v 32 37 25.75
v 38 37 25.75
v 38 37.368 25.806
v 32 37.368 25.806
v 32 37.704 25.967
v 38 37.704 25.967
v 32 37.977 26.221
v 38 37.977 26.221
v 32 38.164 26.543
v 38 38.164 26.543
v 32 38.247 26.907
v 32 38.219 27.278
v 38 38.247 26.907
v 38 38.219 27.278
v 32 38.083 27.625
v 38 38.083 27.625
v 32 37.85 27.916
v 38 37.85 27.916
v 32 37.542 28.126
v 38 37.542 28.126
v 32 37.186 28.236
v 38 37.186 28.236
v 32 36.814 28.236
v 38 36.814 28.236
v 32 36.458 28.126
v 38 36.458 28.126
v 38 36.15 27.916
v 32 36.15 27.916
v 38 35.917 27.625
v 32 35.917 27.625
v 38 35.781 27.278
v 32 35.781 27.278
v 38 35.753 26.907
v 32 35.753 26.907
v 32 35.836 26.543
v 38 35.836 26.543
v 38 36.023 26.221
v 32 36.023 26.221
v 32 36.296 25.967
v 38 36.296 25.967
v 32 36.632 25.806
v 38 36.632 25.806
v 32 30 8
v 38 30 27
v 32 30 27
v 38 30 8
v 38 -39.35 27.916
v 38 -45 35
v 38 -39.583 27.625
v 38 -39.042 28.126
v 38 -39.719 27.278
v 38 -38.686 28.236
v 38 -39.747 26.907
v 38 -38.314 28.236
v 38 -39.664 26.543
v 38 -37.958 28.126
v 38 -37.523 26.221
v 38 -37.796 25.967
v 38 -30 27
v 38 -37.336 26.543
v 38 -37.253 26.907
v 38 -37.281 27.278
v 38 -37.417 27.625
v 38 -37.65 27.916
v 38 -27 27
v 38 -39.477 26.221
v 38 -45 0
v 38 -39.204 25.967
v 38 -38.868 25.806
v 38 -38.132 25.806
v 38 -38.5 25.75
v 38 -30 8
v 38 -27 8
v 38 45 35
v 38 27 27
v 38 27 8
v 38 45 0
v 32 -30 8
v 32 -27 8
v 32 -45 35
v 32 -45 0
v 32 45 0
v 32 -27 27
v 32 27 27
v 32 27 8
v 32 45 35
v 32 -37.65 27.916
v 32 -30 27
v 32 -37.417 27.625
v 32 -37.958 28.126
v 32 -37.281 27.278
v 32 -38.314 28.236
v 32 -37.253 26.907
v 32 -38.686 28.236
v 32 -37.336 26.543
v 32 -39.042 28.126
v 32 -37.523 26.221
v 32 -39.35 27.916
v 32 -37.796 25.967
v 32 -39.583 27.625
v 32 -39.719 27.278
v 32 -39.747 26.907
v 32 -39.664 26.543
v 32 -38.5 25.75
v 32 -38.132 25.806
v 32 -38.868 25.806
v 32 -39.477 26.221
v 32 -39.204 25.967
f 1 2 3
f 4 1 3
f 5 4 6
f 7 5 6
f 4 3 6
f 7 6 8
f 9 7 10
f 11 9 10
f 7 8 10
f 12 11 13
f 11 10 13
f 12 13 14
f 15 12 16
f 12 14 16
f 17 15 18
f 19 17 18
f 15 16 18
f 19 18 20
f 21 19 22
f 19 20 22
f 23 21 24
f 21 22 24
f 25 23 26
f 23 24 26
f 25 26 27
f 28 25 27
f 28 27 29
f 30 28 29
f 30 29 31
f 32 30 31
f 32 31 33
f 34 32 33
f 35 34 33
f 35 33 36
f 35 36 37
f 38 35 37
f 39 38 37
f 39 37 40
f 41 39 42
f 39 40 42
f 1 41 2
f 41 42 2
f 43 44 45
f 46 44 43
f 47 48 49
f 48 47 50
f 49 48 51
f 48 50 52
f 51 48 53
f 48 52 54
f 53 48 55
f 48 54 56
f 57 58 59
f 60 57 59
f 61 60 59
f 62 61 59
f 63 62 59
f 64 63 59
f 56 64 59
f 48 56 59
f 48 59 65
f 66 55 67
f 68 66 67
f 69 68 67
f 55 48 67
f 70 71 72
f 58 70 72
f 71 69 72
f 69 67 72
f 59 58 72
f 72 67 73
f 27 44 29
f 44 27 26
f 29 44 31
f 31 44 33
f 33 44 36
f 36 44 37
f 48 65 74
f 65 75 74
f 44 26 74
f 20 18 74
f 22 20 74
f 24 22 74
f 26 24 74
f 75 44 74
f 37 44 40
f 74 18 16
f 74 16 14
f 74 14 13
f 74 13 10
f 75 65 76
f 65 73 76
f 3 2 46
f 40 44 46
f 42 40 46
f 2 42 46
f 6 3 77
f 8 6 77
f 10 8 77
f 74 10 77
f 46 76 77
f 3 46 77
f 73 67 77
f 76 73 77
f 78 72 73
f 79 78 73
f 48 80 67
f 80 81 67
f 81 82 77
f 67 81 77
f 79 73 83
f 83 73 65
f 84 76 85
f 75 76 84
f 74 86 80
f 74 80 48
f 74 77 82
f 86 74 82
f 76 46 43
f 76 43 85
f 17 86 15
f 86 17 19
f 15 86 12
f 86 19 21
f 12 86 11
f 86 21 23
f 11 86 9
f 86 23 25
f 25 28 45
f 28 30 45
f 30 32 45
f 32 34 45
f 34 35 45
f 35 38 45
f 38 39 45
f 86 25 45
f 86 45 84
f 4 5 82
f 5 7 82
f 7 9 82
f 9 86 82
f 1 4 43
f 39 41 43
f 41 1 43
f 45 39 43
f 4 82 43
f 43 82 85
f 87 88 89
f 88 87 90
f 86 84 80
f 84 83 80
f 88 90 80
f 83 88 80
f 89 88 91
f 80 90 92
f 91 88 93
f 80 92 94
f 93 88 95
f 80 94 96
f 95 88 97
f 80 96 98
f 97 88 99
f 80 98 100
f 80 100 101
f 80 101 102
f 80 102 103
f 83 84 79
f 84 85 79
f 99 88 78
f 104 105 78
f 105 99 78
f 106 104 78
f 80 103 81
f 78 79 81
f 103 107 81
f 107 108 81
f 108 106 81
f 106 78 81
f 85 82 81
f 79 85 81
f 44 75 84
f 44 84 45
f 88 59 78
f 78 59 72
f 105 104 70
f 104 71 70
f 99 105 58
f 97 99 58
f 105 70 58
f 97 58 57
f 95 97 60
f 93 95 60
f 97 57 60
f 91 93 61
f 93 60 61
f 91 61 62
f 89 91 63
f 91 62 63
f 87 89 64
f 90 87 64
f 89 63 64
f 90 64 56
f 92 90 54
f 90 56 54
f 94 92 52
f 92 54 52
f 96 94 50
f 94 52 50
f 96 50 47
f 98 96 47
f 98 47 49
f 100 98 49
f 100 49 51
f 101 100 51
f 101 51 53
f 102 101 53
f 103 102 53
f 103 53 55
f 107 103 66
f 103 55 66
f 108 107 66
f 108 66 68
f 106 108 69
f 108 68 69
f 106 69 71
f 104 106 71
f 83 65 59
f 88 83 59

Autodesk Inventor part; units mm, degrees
ref_plane "YZ Plane" through (0, 0, 0) normal (1, 0, 0) x (0, 1, 0)
ref_plane "XZ Plane" through (0, 0, 0) normal (0, 1, 0) x (-1, 0, 0)
ref_plane "XY Plane" through (0, 0, 0) normal (0, 0, 1) x (1, 0, 0)
ref_plane "작업 평면1" through (0, 0, 0) normal (0, 0, 1) x (1, 0, 0)
sketch "스케치1" plane through (0, 0, 0) normal (0, 0, 1) x (1, 0, 0)
  line L0 (42.4906, -94.9526) -> (42.4906, 93.0474) projected
  line L1 (42.4906, 93.0474) -> (-42.5094, 93.0474) projected
  line L2 (-42.5094, 93.0474) -> (-42.5094, -94.9526) projected
  line L3 (-42.5094, -94.9526) -> (42.4906, -94.9526) projected
  line L4 (0, 0) -> (0, 35)
  line L5 (0, 0) -> (25, 0)
  line L6 (0, 0) -> (0, -35)
  line L7 (0, 0) -> (-25, 0)
  line L8 (25, 35) -> (-25, 35)
  line L9 (-25, 35) -> (-25, -35)
  line L10 (-25, -35) -> (25, -35)
  line L11 (25, -35) -> (25, 35)
  line L12 (35, 45) -> (-35, 45)
  line L13 (-35, 45) -> (-35, -45)
  line L14 (-35, -45) -> (35, -45)
  line L15 (35, -45) -> (35, 45)
  line L16 (35, 45) -> (38, 45)
  line L17 (38, 45) -> (32, 45)
  line L18 (32, 45) -> (32, -45)
  line L19 (32, -45) -> (38, -45)
  line L20 (38, -45) -> (38, 45)
  line L21 (-35, 45) -> (-38, 45)
  line L22 (-38, 45) -> (-38, 42)
  line L23 (-38, 42) -> (-35, 42)
  line L24 (-35, 42) -> (-35, 45)
  line L25 (-38, 45) -> (-32, 45)
  line L26 (-32, 45) -> (-32, -45)
  line L27 (-32, -45) -> (-38, -45)
  line L28 (-38, -45) -> (-38, 45)
  circle A0 centre (7, -59) radius 1.25 projected
  circle A1 centre (-1, 59) radius 1.25 projected
  circle A2 centre (-1, -59) radius 1.25 projected
  circle A3 centre (7, 59) radius 1.25 projected
  dimension "d0" = 35
  dimension "d1" = 25
  dimension "d2" = 35
  dimension "d3" = 25
  dimension "d4" = 10
  dimension "d5" = 3
  dimension "d6" = 6
  dimension "d7" = 3
  dimension "d8" = 3
  dimension "d9" = 6
extrude "돌출1" add sketch "스케치1" along normal blind 35 contours L15 L14 L18 L12 | L16 L20 L19 L15
sketch "스케치2" plane through (38, -45, 0) normal (1, 0, 0) x (0, 0, -1)
  circle A0 centre (-27, 82) radius 1.25 projected
  line L0 (-22, 77) -> (-32, 77) projected
  line L1 (-32, 77) -> (-32, 87) projected
  line L2 (-32, 87) -> (-22, 87) projected
  line L3 (-22, 87) -> (-22, 77) projected
  circle A1 centre (-27, 6.5) radius 1.25 projected
  line L4 (-32, 3) -> (-32, 10) projected
  line L5 (-22, 10) -> (-32, 10) projected
  line L6 (-22, 3) -> (-22, 10) projected
  line L7 (-32, 3) -> (-22, 3) projected
  point P0 (0, 45)
extrude "돌출2" cut sketch "스케치2" against normal blind 35 contours A0 | A1
sketch "스케치3" plane through (38, -45, 0) normal (1, 0, 0) x (0, 0, -1)
  circle A0 centre (-27, 82) radius 1.25 projected
  circle A1 centre (-27, 6.5) radius 1.25 projected
  line L0 (0, 0) -> (0, 90) projected
  line L1 (0, 90) -> (-35, 90) projected
  line L2 (-35, 0) -> (-35, 90) projected
  line L3 (0, 0) -> (-35, 0) projected
  line L4 (0, 0) -> (-35, 0) projected
  line L5 (-35, 0) -> (-35, 90) projected
  line L6 (0, 0) -> (0, 90) projected
  line L7 (-27, 15) -> (-8, 15)
  line L8 (-8, 15) -> (-8, 18)
  line L9 (-8, 18) -> (-27, 18)
  line L10 (-27, 18) -> (-27, 15)
  line L11 (0, 90) -> (-35, 90) projected
  line L12 (-27, 75) -> (-8, 75)
  line L13 (-8, 75) -> (-8, 72)
  line L14 (-8, 72) -> (-27, 72)
  line L15 (-27, 72) -> (-27, 75)
  point P0 (0, 45)
  point P1 (-18.9095, 15)
  point P2 (-17.5, 0)
  point P3 (-8, 18.9545)
  point P4 (-18.9095, 75)
  point P5 (-17.5, 90)
  point P6 (-27, 64.4269)
  dimension "d14" = 15
  dimension "d15" = 8
  dimension "d16" = 8
  dimension "d17" = 3
  dimension "d18" = 15
  dimension "d19" = 8
  dimension "d20" = 3
extrude "돌출3" cut sketch "스케치3" against normal blind 35 contours L10 L9 L8 L7 | L12 L13 L14 L15
properties part number "60" material "아크릴, 선명"
